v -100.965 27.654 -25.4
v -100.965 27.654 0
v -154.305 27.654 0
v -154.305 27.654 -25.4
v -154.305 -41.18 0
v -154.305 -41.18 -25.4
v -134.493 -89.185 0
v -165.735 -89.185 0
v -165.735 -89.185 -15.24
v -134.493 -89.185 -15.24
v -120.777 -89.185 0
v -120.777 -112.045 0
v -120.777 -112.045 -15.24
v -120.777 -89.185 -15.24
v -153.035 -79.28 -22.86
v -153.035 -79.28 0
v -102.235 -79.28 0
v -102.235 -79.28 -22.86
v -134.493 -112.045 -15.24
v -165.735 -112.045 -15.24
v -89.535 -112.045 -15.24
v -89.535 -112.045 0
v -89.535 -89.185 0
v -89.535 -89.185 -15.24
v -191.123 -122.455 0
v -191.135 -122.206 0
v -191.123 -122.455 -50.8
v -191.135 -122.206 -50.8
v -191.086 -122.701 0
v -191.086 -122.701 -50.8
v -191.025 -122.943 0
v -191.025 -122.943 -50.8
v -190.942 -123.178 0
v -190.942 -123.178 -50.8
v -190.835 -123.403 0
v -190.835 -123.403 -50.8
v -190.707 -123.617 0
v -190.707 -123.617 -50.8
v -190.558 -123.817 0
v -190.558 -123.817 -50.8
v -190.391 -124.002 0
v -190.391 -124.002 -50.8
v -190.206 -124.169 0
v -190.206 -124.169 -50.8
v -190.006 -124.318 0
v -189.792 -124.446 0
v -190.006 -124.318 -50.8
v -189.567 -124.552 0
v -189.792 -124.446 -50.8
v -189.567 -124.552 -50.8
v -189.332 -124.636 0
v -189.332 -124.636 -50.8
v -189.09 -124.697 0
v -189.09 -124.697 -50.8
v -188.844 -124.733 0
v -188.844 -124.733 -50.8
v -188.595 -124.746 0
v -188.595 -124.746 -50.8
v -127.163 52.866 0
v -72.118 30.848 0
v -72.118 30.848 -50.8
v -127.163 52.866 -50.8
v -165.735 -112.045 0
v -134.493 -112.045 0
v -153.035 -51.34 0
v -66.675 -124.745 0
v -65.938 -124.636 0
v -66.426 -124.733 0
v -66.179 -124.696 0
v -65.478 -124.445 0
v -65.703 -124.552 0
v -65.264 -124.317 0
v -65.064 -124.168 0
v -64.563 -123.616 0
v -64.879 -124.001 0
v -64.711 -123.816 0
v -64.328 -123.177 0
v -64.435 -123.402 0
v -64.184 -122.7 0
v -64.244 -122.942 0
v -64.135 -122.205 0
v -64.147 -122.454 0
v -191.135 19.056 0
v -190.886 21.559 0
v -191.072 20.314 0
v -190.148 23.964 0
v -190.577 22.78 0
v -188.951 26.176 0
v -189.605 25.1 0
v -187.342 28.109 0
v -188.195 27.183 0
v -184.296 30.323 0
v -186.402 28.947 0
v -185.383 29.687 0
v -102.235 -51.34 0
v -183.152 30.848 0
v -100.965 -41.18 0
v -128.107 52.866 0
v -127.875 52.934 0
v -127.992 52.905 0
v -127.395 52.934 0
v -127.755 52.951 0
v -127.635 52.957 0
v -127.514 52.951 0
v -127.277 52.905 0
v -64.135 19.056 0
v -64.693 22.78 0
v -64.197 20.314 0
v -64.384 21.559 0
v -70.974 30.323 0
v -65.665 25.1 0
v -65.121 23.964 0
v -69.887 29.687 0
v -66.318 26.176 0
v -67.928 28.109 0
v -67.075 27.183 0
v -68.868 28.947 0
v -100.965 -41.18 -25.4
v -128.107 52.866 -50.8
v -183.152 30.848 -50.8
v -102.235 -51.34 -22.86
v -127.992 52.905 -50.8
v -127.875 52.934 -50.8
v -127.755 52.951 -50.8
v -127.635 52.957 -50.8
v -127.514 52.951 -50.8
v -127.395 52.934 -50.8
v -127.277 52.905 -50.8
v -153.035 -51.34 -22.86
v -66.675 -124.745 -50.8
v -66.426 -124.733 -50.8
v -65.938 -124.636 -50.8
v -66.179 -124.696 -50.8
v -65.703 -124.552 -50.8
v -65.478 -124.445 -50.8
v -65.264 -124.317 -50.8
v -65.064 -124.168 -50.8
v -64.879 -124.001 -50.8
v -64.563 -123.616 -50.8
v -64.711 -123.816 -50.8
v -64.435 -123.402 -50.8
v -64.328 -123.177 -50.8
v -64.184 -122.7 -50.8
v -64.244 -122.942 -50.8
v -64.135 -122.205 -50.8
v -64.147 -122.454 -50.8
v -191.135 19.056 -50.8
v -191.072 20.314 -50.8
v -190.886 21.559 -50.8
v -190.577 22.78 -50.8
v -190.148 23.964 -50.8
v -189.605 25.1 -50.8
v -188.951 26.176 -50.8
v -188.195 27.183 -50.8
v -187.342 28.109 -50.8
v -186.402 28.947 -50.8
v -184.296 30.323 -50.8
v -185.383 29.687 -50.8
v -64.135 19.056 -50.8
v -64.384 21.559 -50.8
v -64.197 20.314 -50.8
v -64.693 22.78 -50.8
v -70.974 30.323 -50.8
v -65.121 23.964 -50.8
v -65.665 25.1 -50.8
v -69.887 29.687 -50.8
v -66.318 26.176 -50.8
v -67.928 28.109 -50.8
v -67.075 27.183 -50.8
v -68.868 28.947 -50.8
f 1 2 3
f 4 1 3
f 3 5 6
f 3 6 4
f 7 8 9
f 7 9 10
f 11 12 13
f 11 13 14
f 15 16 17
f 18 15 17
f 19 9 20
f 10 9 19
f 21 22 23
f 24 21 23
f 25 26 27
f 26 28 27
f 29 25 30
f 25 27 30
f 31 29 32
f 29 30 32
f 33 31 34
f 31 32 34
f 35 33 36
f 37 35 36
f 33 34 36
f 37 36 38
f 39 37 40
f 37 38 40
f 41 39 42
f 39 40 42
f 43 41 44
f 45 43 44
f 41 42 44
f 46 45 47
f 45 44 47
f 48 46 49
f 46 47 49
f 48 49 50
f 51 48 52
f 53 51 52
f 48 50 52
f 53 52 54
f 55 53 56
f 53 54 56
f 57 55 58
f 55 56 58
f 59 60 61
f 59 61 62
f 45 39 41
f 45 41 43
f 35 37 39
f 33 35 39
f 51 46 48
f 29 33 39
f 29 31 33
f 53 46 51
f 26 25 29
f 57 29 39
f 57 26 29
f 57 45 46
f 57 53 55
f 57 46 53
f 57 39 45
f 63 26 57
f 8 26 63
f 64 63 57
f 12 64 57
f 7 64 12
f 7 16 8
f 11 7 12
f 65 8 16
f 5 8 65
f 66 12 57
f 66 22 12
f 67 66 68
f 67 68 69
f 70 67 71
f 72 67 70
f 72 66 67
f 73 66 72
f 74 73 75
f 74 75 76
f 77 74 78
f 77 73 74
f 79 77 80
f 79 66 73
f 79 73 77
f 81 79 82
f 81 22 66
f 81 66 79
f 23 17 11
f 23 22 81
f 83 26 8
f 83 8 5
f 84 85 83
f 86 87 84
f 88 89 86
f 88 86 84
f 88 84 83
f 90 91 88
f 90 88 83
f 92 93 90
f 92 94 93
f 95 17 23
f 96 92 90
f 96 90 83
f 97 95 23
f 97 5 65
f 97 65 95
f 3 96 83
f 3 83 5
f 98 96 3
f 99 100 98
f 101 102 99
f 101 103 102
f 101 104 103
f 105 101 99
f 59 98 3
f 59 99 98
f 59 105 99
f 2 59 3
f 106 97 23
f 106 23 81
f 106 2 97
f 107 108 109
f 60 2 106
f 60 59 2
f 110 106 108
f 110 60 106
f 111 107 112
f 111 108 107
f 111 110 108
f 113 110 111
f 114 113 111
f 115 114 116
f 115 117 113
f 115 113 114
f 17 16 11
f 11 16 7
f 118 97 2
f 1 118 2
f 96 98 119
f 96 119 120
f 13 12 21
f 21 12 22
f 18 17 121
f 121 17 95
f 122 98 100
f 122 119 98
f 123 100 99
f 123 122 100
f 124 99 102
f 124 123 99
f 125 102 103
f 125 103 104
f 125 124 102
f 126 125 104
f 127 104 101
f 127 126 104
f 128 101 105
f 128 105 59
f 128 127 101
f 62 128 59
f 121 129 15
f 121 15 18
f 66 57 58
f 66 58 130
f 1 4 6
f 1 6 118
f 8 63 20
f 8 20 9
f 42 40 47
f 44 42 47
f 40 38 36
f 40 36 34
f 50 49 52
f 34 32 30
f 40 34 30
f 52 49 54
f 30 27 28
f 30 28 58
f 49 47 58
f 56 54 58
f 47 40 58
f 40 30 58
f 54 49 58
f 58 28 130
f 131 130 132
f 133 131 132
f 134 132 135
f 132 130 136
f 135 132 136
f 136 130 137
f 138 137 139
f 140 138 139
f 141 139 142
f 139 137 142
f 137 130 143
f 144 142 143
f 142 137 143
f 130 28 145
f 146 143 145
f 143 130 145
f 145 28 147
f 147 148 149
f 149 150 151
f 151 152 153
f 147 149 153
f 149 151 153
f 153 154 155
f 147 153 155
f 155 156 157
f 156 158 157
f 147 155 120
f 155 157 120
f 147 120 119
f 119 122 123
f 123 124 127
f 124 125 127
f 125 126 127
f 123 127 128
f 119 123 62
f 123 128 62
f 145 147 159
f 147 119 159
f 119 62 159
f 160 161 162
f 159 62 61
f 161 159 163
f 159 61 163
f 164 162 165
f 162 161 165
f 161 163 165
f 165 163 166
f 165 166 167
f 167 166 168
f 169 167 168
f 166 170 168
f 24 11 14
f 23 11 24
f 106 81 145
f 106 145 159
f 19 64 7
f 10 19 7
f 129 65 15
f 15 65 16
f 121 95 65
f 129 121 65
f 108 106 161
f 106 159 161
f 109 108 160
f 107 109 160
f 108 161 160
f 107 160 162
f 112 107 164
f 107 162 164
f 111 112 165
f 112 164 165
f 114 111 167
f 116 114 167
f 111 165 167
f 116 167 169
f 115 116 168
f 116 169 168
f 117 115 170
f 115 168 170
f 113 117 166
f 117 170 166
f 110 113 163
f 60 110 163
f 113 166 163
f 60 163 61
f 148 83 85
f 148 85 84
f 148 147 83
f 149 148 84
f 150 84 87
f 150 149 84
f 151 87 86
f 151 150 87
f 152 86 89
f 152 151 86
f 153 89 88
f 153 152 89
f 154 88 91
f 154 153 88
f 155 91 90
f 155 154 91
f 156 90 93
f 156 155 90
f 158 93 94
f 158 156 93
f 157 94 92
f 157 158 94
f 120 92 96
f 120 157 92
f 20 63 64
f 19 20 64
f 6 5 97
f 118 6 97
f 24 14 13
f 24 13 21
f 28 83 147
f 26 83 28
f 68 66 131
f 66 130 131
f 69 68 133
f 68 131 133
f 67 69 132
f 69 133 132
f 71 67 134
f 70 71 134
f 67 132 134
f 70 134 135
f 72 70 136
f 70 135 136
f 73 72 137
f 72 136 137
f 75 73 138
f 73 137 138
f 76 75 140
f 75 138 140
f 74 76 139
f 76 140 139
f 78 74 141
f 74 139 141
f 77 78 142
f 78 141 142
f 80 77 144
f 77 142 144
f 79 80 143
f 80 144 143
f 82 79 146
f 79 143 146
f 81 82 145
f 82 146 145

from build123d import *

# Parameters (mm, degrees)
F0_W     = 31.242
F0_H     = 22.86
F0_W_2   = 26.67
F0_H_2   = 68.834
F1_DEPTH = 50.8
F2_R     = 12.7
F3_R     = 12.7
F4_R     = 1.27
F5_R     = 2.54
F6_R     = 2.54
F7_DEPTH = 25.4
F8_DEPTH = 15.24
F9_DEPTH = 22.86


with BuildPart() as f1:
    # F0 (on Top) → F1 (new body)
    with BuildSketch(Plane.XY):
        Polygon((-191.1348653173, 27.6544209014), (-191.1348653173, -124.7455790986), (-64.1348653173, -124.7449096382), (-64.1348653173, 27.6544209014), (-127.6348653138, 53.0544209014), align=None)
        with Locations((-150.1138653173, -100.6154452065)):
            Rectangle(F0_W, F0_H, mode=Mode.SUBTRACT)
        with Locations((-105.1558653173, -100.6154452065)):
            Rectangle(F0_W, F0_H, mode=Mode.SUBTRACT)
        Polygon((-153.0348653138, -51.3395790986), (-127.6348653138, -51.3395790986), (-102.2348653138, -51.3395790986), (-102.2348653138, -79.2795790986), (-153.0348653138, -79.2795790986), align=None, mode=Mode.SUBTRACT)
        Polygon((-154.3048653138, 27.6544209014), (-127.6348653138, 27.6544209014), (-100.9648653138, 27.6544209014), (-100.9648653138, -41.1795790986), (-127.6348653138, -41.1795790986), (-154.3048653138, -41.1795790986), align=None, mode=Mode.SUBTRACT)
        with Locations((-140.9698653138, -6.7625790986)):
            Rectangle(F0_W_2, F0_H_2)
        with Locations((-114.2998653138, -6.7625790986)):
            Rectangle(F0_W_2, F0_H_2)
        with Locations((-150.1138653173, -100.6154452065)):
            Rectangle(F0_W, F0_H)
        with Locations((-105.1558653173, -100.6154452065)):
            Rectangle(F0_W, F0_H)
        Polygon((-102.2348653138, -51.3395790986), (-127.6348653138, -51.3395790986), (-153.0348653138, -51.3395790986), (-153.0348653138, -79.2795790986), (-102.2348653138, -79.2795790986), align=None)
    extrude(amount=-F1_DEPTH)

    # F2
    f2_edges = [f1.edges().sort_by_distance(p)[0] for p in [
        (-64.134865, 27.654421, -25.4),
    ]]
    fillet(f2_edges, radius=F2_R)

    # F3
    f3_edges = [f1.edges().sort_by_distance(p)[0] for p in [
        (-191.134865, 27.654421, -25.4),
    ]]
    fillet(f3_edges, radius=F3_R)

    # F4
    f4_edges = [f1.edges().sort_by_distance(p)[0] for p in [
        (-127.634865, 53.054421, -25.4),
    ]]
    fillet(f4_edges, radius=F4_R)

    # F5
    f5_edges = [f1.edges().sort_by_distance(p)[0] for p in [
        (-191.134865, -124.745579, -25.4),
    ]]
    fillet(f5_edges, radius=F5_R)

    # F6
    f6_edges = [f1.edges().sort_by_distance(p)[0] for p in [
        (-64.134865, -124.74491, -25.4),
    ]]
    fillet(f6_edges, radius=F6_R)

    # F0 (on Top) → F7 (cut)
    with BuildSketch(Plane.XY):
        with Locations((-140.9698653138, -6.7625790986)):
            Rectangle(F0_W_2, F0_H_2)
        with Locations((-114.2998653138, -6.7625790986)):
            Rectangle(F0_W_2, F0_H_2)
    extrude(amount=-F7_DEPTH, mode=Mode.SUBTRACT)

    # F0 (on Top) → F8 (cut)
    with BuildSketch(Plane.XY):
        with Locations((-150.1138653173, -100.6154452065)):
            Rectangle(F0_W, F0_H)
        with Locations((-105.1558653173, -100.6154452065)):
            Rectangle(F0_W, F0_H)
    extrude(amount=-F8_DEPTH, mode=Mode.SUBTRACT)

    # F0 (on Top) → F9 (cut)
    with BuildSketch(Plane.XY):
        Polygon((-102.2348653138, -51.3395790986), (-127.6348653138, -51.3395790986), (-153.0348653138, -51.3395790986), (-153.0348653138, -79.2795790986), (-102.2348653138, -79.2795790986), align=None)
    extrude(amount=-F9_DEPTH, mode=Mode.SUBTRACT)


solid = f1.part
